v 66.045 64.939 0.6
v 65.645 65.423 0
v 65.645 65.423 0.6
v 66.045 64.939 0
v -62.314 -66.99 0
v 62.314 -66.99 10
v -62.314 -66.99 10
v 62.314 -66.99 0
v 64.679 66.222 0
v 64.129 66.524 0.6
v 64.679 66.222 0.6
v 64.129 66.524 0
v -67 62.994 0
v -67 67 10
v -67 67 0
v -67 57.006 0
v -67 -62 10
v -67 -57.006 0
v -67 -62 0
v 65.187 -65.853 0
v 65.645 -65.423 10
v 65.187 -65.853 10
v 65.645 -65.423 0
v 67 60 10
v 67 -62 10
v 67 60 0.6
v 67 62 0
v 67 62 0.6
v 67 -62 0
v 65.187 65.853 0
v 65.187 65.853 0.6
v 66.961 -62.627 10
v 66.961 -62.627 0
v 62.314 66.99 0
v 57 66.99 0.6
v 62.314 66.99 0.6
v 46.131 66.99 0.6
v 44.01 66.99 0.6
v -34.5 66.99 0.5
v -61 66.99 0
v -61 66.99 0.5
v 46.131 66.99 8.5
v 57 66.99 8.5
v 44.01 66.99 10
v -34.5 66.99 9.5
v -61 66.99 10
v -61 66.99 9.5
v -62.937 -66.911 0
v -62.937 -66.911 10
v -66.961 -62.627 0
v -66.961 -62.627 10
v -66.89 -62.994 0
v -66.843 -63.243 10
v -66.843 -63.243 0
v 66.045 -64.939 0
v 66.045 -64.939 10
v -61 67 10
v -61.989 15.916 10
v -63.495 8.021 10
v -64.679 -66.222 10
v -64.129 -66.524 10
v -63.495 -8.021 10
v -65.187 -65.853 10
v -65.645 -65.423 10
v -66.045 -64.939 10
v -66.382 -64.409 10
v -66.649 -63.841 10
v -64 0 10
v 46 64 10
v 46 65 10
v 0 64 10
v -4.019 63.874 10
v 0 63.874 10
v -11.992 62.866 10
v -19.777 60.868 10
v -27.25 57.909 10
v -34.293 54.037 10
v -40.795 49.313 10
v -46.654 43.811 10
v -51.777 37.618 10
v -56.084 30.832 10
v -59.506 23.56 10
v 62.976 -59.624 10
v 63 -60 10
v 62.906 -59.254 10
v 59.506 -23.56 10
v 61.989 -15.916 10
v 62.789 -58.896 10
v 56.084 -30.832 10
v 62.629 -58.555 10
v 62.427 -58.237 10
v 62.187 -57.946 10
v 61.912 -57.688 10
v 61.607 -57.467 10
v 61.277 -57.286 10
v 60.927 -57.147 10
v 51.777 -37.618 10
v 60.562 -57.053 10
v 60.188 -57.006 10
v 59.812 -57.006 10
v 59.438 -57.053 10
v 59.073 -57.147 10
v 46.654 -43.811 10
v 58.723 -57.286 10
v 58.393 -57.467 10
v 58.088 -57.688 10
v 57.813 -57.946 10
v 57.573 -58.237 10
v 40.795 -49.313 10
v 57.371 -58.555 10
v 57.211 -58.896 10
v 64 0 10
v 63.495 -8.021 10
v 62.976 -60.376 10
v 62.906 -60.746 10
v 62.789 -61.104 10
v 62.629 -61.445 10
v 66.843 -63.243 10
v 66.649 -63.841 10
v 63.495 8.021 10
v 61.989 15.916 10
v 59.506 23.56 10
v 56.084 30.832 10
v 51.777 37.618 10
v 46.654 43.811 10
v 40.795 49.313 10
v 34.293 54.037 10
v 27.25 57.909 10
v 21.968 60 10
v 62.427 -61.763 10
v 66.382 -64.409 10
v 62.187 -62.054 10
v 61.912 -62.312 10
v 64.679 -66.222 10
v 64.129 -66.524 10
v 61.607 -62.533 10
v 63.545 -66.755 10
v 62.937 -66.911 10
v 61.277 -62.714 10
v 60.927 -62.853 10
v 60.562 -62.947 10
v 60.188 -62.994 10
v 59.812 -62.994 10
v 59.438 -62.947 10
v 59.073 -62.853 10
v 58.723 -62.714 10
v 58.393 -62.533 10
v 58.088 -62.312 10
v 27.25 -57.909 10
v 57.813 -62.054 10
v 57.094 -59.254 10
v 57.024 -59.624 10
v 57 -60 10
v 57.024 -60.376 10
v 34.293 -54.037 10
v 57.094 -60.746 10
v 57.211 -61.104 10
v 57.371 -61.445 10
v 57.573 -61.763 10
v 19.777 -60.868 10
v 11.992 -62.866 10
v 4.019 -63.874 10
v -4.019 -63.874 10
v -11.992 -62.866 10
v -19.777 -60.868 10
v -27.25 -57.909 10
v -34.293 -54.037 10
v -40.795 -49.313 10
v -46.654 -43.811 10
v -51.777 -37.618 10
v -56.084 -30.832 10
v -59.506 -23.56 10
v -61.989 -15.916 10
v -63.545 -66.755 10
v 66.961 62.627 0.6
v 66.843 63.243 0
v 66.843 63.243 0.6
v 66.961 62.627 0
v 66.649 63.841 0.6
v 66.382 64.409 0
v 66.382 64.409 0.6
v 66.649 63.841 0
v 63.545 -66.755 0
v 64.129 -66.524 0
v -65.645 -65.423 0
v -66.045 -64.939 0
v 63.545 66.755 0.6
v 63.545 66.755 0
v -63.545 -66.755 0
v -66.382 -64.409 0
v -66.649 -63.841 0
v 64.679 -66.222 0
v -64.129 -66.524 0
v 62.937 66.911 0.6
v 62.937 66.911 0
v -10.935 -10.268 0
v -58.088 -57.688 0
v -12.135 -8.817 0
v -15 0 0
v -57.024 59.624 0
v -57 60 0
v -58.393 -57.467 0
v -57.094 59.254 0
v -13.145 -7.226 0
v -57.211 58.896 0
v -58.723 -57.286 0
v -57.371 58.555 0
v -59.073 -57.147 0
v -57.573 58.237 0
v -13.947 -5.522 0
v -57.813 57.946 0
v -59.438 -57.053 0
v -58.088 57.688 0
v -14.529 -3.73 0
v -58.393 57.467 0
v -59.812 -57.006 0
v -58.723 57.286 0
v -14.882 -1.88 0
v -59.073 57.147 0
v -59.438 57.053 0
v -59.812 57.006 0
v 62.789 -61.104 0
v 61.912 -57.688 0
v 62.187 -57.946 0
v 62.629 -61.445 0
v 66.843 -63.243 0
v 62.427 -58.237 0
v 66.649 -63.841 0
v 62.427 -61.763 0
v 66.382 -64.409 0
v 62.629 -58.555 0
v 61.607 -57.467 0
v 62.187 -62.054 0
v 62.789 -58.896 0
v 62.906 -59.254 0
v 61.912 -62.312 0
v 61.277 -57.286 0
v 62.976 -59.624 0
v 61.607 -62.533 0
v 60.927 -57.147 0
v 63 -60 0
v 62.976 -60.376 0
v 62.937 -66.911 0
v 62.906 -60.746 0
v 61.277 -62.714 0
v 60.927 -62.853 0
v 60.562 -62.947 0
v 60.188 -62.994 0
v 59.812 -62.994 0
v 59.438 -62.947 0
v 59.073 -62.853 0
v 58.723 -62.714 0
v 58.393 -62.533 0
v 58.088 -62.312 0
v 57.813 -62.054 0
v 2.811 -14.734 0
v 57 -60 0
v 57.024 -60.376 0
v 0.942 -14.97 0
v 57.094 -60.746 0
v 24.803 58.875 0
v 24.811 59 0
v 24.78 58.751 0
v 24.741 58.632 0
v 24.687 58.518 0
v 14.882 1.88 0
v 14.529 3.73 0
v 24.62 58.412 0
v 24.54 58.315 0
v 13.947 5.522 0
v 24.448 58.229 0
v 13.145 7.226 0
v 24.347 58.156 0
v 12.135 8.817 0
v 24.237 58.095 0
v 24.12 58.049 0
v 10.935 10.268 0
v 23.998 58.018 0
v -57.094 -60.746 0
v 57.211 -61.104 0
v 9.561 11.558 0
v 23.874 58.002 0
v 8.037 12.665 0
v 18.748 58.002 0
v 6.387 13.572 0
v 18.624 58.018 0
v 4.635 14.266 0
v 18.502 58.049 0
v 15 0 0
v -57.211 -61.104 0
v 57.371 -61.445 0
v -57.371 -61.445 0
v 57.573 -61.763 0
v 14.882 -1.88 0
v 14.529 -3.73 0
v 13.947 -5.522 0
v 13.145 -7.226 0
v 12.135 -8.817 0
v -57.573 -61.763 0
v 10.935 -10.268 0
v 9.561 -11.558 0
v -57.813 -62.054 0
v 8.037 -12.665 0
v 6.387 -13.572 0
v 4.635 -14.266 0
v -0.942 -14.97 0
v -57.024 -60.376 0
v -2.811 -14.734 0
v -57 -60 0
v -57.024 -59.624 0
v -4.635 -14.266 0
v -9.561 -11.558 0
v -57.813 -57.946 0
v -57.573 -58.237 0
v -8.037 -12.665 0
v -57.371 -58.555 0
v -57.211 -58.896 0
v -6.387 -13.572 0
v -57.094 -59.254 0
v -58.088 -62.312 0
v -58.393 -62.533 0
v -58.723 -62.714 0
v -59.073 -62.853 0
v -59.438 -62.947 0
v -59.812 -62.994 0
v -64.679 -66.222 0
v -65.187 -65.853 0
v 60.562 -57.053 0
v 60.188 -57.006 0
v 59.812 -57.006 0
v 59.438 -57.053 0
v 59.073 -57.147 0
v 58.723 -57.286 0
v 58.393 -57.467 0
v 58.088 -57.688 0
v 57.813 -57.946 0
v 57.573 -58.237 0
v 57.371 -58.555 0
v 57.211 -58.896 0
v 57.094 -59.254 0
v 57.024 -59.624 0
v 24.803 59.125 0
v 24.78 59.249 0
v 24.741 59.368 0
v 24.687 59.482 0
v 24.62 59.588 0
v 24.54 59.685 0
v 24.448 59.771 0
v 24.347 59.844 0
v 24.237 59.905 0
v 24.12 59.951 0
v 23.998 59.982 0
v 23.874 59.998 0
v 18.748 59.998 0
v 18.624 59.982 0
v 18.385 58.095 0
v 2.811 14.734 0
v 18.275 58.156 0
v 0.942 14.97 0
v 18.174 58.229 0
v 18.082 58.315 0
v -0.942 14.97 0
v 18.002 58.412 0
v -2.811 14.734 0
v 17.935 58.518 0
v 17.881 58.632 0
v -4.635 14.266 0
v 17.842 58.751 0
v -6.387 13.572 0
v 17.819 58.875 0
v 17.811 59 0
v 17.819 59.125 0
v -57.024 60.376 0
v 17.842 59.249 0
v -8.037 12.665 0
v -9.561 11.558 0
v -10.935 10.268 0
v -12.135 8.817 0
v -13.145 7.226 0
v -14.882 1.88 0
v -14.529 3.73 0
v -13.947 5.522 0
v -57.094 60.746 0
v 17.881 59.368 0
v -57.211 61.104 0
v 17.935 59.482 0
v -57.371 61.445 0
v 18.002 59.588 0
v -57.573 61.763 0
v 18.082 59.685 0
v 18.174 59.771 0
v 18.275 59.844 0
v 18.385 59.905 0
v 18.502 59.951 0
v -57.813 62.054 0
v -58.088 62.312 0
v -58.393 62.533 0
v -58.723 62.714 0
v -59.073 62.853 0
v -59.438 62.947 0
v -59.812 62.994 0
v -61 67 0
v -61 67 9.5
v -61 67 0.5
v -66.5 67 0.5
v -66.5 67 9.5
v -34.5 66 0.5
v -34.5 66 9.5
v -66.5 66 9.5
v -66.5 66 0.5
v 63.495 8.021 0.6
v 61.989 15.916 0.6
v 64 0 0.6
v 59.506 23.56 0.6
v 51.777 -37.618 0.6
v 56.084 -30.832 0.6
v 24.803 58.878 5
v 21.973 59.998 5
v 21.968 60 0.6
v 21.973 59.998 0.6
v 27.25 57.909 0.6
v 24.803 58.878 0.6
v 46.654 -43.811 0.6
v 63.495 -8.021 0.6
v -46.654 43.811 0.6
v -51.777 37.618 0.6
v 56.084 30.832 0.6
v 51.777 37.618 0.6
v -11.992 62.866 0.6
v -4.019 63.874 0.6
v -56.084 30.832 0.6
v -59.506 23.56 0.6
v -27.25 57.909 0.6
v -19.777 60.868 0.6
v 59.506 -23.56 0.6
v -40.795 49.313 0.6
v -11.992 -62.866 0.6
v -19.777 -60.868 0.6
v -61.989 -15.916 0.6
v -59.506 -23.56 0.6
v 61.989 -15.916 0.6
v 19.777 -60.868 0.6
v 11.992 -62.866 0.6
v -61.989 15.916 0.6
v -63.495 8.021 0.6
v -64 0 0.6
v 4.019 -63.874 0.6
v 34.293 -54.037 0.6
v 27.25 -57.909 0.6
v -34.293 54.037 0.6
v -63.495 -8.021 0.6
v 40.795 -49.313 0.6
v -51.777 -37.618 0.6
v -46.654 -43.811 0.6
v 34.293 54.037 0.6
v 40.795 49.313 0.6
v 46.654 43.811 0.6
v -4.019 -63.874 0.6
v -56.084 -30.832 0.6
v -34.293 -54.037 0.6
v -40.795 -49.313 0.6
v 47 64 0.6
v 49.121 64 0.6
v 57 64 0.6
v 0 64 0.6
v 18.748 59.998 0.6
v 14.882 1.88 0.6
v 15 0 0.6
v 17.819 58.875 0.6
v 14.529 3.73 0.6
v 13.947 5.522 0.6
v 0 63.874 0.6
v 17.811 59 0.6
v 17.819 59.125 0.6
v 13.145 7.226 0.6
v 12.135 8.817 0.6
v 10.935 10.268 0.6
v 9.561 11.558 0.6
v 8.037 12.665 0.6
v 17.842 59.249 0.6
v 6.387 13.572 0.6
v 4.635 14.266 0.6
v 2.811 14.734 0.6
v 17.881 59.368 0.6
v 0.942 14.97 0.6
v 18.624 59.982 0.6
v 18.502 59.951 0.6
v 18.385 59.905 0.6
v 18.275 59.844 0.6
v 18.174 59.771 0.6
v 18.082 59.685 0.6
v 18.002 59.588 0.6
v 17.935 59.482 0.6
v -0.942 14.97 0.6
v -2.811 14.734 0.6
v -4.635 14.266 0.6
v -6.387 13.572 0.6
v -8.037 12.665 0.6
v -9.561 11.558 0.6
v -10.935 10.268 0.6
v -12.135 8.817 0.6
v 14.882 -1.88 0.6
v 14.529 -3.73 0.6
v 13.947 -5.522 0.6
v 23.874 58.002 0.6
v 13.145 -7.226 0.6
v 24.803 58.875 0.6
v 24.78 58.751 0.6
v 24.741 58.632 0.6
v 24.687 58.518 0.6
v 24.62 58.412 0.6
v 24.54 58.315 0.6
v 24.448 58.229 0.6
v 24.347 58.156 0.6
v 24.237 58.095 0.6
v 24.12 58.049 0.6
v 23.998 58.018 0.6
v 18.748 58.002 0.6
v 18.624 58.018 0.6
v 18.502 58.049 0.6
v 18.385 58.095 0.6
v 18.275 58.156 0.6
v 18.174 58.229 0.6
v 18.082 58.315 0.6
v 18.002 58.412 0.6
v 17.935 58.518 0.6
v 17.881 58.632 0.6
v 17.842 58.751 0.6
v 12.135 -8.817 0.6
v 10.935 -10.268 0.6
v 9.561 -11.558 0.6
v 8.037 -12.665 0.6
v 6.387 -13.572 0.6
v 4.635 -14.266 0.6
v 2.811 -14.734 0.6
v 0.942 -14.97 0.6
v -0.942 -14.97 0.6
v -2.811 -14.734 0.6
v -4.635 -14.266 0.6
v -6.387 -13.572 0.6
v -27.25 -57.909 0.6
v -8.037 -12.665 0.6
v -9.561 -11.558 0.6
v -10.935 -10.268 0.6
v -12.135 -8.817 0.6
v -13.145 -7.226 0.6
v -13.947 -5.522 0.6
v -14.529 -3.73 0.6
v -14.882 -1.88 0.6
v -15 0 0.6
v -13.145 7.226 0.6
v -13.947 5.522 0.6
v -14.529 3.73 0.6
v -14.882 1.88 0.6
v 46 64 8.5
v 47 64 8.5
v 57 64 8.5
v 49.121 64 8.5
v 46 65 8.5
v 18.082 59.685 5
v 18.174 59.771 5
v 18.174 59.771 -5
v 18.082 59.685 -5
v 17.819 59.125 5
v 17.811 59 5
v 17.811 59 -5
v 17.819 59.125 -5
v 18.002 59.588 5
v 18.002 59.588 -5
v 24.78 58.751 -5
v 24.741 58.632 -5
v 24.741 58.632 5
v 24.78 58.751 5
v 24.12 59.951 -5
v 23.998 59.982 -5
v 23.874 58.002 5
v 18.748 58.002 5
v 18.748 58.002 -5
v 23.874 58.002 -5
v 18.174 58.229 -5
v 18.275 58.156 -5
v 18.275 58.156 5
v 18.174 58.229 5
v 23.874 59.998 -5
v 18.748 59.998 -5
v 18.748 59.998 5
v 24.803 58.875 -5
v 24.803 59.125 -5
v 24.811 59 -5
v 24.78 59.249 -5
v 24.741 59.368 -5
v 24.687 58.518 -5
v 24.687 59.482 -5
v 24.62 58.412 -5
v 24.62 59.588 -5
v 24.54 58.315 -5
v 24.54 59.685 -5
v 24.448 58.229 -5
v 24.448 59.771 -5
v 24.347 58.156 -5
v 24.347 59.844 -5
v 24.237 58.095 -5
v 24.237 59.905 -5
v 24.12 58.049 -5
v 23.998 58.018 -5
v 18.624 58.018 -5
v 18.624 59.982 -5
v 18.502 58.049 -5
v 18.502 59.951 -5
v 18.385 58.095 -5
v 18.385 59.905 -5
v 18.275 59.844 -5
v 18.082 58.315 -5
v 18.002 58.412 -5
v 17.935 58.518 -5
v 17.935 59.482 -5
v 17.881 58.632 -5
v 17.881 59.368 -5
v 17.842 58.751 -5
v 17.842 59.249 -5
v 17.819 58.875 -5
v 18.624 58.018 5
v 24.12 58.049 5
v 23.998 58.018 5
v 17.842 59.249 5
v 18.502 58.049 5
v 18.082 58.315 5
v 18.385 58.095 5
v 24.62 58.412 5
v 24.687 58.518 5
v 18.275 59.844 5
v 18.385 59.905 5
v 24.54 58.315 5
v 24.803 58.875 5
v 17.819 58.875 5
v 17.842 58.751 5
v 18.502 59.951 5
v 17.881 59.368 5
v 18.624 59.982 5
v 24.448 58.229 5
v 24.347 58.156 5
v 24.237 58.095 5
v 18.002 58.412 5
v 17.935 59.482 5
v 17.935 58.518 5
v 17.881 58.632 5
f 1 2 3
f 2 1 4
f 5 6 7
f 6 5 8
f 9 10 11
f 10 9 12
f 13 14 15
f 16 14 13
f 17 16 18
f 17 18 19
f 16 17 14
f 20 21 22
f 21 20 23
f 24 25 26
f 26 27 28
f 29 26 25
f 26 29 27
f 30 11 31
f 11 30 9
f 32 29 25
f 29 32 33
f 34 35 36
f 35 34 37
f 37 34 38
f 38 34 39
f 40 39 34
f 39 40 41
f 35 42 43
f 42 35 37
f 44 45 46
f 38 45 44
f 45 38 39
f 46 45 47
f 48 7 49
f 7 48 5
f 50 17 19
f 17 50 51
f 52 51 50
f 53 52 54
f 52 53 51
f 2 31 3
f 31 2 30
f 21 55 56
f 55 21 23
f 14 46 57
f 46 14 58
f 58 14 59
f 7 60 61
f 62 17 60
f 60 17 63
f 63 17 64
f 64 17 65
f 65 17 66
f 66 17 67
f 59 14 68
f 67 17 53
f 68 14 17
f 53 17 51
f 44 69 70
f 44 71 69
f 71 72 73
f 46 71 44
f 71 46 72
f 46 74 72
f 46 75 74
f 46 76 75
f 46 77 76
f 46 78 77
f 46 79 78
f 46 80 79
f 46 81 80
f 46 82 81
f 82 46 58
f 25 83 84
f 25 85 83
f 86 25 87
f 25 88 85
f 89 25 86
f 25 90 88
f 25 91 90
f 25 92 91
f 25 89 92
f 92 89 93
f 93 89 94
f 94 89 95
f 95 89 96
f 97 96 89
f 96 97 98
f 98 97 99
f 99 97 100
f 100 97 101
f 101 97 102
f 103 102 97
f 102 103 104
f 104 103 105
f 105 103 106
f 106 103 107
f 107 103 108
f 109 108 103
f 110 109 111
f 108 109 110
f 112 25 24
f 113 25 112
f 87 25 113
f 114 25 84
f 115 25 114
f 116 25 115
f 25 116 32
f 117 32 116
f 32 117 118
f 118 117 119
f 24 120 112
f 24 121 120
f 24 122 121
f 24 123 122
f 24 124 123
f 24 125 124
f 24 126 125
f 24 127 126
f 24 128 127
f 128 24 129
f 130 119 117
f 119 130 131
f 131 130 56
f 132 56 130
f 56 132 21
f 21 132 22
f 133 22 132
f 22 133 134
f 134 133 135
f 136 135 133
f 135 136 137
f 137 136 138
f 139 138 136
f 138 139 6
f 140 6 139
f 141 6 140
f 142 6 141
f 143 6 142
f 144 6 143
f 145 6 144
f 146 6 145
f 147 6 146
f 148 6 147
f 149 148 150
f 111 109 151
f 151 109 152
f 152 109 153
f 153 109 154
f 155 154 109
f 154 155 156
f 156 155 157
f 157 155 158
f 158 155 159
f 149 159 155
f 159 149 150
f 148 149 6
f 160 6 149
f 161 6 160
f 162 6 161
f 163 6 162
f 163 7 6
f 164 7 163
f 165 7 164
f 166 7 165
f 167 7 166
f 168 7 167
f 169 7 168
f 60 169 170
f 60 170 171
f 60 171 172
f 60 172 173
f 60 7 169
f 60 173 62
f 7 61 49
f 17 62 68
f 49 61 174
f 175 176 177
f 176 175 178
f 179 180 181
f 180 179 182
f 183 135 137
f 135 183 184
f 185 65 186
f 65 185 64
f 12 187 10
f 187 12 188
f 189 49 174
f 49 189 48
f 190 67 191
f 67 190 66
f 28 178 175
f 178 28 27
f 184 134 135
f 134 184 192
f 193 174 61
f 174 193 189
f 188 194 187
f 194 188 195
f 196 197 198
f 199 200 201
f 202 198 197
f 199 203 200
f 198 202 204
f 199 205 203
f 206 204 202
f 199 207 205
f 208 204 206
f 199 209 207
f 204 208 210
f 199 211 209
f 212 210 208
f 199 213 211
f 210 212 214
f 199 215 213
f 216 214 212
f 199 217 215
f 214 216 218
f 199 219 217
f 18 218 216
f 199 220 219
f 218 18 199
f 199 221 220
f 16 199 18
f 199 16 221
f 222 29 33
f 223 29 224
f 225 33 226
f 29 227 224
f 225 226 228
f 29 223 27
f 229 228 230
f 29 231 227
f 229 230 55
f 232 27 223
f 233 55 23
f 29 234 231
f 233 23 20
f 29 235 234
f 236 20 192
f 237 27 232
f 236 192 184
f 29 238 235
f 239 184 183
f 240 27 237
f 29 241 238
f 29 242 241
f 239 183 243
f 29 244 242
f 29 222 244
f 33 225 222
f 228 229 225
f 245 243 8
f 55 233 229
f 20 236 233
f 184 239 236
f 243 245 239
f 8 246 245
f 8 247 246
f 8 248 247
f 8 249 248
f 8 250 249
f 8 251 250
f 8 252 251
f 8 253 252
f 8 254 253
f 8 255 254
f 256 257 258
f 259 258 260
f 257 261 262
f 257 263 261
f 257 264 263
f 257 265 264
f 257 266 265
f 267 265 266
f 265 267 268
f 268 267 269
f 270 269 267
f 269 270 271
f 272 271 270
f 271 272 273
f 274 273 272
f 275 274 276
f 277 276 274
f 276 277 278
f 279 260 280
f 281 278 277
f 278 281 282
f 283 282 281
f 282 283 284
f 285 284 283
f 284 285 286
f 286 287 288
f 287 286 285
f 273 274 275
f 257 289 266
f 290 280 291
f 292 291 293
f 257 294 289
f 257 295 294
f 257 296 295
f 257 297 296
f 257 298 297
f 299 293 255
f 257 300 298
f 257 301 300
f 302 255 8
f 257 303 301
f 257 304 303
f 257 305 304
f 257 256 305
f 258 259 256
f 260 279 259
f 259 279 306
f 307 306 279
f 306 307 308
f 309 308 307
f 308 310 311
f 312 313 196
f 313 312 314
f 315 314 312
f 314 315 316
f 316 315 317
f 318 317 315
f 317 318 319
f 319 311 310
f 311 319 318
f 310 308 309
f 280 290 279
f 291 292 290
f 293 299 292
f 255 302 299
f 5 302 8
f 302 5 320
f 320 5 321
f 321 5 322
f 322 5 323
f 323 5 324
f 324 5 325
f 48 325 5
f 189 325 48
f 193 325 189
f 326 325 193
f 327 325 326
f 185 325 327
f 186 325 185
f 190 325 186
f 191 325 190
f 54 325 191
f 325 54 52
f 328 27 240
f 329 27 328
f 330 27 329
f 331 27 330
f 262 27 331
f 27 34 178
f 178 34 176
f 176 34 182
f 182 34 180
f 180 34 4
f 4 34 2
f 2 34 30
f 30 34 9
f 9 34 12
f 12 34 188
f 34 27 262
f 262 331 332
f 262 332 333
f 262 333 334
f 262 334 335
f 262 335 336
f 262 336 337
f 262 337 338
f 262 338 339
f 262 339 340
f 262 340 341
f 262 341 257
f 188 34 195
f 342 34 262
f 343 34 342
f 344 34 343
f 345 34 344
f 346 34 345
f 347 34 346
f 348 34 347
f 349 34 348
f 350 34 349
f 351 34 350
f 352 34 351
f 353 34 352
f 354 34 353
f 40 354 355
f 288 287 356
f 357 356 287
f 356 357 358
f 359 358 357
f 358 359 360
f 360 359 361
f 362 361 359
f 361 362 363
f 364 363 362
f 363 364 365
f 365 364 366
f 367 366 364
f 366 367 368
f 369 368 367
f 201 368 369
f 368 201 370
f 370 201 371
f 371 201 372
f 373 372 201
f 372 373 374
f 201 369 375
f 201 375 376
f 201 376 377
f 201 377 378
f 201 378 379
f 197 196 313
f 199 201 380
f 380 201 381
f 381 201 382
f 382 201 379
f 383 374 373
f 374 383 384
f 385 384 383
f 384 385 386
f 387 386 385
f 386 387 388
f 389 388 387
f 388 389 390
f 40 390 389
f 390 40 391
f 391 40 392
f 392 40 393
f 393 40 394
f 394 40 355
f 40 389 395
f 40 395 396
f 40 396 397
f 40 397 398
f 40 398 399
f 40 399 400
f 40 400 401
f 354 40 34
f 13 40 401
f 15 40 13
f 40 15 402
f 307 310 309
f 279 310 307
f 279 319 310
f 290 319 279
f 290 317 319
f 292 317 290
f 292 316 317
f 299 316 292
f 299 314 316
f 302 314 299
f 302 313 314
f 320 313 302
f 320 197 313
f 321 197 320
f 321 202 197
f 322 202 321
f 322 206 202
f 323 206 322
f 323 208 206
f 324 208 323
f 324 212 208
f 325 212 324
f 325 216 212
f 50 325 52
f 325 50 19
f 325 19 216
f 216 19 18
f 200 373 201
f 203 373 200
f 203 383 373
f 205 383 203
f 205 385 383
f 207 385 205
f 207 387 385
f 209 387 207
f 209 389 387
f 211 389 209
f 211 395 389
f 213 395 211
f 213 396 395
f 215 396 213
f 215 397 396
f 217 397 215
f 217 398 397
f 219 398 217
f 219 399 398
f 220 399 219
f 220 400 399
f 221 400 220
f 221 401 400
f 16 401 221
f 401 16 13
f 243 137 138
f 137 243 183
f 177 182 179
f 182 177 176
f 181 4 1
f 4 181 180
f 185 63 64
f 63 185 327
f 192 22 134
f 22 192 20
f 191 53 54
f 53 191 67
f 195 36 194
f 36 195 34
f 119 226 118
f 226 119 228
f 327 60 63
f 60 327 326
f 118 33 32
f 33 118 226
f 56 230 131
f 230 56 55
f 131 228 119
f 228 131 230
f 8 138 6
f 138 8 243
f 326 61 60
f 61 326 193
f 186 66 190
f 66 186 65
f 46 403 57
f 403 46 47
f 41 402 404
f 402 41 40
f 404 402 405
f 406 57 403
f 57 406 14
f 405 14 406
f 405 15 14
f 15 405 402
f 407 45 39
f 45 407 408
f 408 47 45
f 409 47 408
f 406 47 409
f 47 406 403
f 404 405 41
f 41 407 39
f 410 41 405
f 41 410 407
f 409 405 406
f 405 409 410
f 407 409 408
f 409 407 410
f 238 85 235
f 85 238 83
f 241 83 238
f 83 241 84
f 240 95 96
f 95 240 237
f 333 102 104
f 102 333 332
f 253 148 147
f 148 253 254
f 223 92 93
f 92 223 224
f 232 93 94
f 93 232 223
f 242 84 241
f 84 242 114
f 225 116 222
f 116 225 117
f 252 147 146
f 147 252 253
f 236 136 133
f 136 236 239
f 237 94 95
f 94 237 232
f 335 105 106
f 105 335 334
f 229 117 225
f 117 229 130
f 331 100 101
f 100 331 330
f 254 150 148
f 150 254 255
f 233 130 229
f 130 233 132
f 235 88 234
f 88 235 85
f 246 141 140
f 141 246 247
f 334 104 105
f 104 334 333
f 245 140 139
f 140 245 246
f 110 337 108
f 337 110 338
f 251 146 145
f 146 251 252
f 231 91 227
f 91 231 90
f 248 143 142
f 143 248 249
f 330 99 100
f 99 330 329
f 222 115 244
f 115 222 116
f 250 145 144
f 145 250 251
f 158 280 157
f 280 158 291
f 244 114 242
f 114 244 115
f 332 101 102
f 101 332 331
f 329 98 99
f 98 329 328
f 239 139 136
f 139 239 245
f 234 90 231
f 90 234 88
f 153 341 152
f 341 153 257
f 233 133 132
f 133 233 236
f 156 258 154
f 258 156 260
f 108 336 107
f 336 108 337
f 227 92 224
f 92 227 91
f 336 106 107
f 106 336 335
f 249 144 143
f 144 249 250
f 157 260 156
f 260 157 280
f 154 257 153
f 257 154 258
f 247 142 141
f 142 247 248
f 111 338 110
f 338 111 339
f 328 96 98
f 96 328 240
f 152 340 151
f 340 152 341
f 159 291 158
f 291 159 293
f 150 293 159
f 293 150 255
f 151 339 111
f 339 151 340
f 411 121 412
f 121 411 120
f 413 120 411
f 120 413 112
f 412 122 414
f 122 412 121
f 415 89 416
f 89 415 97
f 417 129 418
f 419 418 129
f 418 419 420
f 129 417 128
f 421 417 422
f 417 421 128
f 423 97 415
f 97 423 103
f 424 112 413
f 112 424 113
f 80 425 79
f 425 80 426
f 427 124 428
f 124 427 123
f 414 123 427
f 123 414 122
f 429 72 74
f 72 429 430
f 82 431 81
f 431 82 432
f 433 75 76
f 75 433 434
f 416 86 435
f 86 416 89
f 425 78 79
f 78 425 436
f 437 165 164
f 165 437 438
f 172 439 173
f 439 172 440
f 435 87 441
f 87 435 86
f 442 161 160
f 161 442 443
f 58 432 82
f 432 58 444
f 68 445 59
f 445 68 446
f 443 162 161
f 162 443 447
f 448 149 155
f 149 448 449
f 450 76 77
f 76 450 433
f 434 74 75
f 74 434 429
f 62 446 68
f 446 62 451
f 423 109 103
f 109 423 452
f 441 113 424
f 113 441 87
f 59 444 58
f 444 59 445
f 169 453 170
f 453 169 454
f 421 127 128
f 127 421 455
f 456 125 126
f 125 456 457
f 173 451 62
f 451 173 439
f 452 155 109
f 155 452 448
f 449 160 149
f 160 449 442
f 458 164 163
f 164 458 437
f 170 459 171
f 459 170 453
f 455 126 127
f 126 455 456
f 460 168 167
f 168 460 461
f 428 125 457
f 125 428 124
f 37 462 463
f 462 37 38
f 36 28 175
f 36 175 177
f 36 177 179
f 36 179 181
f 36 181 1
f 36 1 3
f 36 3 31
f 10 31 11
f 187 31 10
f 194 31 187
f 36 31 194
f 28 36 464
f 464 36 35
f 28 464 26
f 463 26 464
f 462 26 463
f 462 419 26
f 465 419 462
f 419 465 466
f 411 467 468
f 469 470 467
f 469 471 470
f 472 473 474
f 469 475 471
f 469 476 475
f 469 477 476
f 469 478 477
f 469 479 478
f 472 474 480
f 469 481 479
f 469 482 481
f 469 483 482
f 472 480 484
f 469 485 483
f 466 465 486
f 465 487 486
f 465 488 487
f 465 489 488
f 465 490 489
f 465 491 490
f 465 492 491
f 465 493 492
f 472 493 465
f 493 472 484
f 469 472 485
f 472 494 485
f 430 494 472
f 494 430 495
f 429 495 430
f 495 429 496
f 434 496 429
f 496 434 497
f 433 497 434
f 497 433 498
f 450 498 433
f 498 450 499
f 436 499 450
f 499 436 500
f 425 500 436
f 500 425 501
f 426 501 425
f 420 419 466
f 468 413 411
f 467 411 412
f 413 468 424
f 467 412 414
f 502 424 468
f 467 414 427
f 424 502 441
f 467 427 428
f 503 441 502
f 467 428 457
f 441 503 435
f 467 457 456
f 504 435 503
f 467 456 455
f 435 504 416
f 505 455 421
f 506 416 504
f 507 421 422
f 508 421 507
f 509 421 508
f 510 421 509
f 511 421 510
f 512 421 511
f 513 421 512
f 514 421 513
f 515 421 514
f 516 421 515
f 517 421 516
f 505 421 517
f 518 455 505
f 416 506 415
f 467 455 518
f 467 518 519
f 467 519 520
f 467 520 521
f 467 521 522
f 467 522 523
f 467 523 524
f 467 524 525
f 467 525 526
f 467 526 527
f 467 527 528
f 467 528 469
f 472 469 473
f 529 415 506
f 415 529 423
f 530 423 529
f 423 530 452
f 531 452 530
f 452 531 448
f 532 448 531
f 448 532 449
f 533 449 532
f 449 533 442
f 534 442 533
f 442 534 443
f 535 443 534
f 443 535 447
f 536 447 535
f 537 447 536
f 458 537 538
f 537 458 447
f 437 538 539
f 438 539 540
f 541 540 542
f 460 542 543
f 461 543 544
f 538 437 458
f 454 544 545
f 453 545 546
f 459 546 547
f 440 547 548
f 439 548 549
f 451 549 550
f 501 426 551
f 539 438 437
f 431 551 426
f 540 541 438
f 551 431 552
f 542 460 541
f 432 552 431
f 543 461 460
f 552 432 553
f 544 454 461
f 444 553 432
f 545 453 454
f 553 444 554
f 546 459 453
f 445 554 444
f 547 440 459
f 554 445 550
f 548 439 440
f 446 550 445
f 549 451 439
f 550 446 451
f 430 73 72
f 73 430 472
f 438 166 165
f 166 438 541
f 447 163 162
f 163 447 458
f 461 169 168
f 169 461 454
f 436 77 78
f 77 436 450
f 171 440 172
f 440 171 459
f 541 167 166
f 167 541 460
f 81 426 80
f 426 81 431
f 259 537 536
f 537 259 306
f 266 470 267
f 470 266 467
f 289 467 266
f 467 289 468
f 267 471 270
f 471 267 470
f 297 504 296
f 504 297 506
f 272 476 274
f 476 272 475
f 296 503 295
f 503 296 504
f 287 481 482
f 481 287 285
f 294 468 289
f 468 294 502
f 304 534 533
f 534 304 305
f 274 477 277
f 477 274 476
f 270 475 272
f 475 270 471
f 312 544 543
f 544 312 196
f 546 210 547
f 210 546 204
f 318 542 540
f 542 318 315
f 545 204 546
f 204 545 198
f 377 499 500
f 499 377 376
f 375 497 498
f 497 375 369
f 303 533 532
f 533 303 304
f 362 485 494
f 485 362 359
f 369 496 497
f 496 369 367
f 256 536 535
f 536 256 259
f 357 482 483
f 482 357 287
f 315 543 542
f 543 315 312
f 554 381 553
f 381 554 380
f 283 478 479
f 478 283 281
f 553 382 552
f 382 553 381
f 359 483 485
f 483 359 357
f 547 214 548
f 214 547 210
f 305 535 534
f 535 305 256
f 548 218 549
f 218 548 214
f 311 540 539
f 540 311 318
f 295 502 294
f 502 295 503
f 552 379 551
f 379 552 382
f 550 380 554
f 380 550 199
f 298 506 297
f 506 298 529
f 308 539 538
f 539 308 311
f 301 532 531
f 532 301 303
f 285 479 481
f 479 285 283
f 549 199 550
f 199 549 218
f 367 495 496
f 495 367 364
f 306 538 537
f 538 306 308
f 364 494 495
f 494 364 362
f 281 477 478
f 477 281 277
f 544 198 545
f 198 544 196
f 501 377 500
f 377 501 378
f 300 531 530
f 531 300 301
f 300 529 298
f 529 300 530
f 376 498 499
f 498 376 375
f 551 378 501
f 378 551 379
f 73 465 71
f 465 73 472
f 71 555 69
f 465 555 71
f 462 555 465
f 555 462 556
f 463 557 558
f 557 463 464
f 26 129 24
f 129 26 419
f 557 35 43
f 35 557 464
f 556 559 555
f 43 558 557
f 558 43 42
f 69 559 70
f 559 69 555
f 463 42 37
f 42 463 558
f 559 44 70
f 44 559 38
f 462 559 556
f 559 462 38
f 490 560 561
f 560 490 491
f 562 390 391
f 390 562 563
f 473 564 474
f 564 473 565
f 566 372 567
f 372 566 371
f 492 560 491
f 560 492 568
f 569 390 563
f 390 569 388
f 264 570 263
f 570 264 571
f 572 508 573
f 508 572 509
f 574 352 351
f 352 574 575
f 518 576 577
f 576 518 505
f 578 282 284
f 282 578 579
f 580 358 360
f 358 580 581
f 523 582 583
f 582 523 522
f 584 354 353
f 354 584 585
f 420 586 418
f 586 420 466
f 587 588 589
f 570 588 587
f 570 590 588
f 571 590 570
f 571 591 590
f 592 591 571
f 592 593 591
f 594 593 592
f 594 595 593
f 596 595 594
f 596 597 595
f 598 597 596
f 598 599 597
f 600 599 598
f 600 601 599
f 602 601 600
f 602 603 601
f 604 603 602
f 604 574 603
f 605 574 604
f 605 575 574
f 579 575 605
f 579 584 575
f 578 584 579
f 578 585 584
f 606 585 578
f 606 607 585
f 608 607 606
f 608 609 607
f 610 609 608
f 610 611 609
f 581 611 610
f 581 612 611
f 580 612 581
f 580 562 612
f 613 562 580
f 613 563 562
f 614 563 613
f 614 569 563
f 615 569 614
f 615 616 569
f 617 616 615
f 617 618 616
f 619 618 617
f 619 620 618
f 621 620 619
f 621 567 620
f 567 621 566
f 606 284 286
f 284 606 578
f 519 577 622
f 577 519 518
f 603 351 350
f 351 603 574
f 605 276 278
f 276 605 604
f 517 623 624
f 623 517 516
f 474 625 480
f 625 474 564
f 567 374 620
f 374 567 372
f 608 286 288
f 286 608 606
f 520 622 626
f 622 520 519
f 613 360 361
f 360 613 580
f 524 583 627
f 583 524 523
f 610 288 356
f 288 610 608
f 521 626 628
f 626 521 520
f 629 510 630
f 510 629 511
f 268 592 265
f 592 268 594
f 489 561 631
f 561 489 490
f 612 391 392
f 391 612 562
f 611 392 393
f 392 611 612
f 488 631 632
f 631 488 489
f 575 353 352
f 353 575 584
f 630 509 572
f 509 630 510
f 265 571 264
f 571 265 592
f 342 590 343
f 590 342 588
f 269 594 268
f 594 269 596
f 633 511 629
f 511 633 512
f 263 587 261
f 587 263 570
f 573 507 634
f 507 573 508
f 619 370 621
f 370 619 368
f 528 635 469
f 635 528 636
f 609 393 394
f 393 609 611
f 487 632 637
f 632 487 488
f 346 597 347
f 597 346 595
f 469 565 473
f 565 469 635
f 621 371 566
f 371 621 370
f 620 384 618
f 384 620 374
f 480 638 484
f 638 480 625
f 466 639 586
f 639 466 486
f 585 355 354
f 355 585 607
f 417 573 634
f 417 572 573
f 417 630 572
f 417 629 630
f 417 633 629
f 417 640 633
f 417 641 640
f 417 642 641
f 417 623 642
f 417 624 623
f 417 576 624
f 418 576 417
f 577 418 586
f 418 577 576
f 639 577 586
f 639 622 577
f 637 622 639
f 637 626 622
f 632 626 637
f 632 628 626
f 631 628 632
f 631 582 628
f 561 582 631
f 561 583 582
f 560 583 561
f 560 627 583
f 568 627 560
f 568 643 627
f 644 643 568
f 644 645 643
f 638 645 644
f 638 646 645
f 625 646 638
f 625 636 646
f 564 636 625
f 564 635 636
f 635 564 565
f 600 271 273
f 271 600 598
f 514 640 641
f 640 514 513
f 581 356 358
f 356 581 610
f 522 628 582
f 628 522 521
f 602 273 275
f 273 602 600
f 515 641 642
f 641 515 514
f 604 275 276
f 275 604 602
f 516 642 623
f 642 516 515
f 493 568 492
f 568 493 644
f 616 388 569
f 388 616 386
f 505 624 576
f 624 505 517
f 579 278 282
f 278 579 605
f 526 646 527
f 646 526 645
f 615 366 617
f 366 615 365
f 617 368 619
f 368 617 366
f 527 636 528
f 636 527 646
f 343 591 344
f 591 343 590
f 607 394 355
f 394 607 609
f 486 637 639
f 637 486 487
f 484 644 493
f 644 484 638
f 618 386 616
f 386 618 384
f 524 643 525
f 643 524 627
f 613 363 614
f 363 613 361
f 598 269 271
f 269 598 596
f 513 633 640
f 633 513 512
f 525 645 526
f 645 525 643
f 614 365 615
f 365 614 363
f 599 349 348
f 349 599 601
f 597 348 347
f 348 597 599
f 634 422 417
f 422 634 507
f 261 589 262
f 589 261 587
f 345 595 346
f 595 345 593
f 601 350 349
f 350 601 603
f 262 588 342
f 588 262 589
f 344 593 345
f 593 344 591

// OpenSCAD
$fn = 50;


union() {
	difference() {
		union() {
			hull() {
				translate(v = [-62.0000000000, 62.0000000000, 0]) {
					cylinder(h = 10, r = 5);
				}
				translate(v = [62.0000000000, 62.0000000000, 0]) {
					cylinder(h = 10, r = 5);
				}
				translate(v = [-62.0000000000, -62.0000000000, 0]) {
					cylinder(h = 10, r = 5);
				}
				translate(v = [62.0000000000, -62.0000000000, 0]) {
					cylinder(h = 10, r = 5);
				}
			}
			translate(v = [-67.0000000000, 61.0000000000, 0]) {
				cube(size = [6, 6, 10]);
			}
		}
		union() {
			translate(v = [-67.5000000000, -60.0000000000, -250.0000000000]) {
				rotate(a = [0, 0, 0]) {
					difference() {
						union() {
							hull() {
								translate(v = [7.5000000000, 0, 0]) {
									cylinder(h = 250, r = 3.0000000000, r1 = 3.0000000000, r2 = 3.0000000000);
								}
								translate(v = [-7.5000000000, 0, 0]) {
									cylinder(h = 250, r = 3.0000000000, r1 = 3.0000000000, r2 = 3.0000000000);
								}
							}
						}
						union();
					}
				}
			}
			translate(v = [-67.5000000000, 60.0000000000, -250.0000000000]) {
				rotate(a = [0, 0, 0]) {
					difference() {
						union() {
							hull() {
								translate(v = [7.5000000000, 0, 0]) {
									cylinder(h = 250, r = 3.0000000000, r1 = 3.0000000000, r2 = 3.0000000000);
								}
								translate(v = [-7.5000000000, 0, 0]) {
									cylinder(h = 250, r = 3.0000000000, r1 = 3.0000000000, r2 = 3.0000000000);
								}
							}
						}
						union();
					}
				}
			}
			translate(v = [-66.5000000000, 66.0000000000, 0.5000000000]) {
				cube(size = [32, 1, 9.0000000000]);
			}
			translate(v = [60.0000000000, -60.0000000000, 0]) {
				cylinder(h = 100, r = 3.0000000000);
			}
			translate(v = [0, 0, 0.6000000000]) {
				cylinder(h = 12.4000000000, r = 64.0000000000);
			}
			translate(v = [0, 0, -5.0000000000]) {
				cylinder(h = 10, r = 15.0000000000);
			}
			translate(v = [0.0000000000, 60.0000000000, 0.6000000000]) {
				cube(size = [67.0000000000, 4, 12.4000000000]);
			}
			translate(v = [57.0000000000, 60.0000000000, 0.6000000000]) {
				cube(size = [10, 7, 12.4000000000]);
			}
			translate(v = [46.0000000000, 60.0000000000, 8.5000000000]) {
				cube(size = [21, 7, 1.5000000000]);
			}
			translate(v = [43.2500000000, 67.7500000000, 0.6000000000]) {
				rotate(a = [0, 0, -45]) {
					cube(size = [7.5000000000, 1.5000000000, 12.4000000000]);
				}
			}
			translate(v = [12.0610000000, 58.0000000000, 0.6000000000]) {
				cube(size = [7.5000000000, 2, 9.4000000000]);
			}
		}
	}
	union() {
		translate(v = [21.3110000000, 59.0000000000, -5.0000000000]) {
			rotate(a = [0, 0, 0]) {
				difference() {
					union() {
						#hull() {
							#translate(v = [2.5000000000, 0, 0]) {
								cylinder(h = 10, r = 1.0000000000, r1 = 1.0000000000, r2 = 1.0000000000);
							}
							#translate(v = [-2.5000000000, 0, 0]) {
								cylinder(h = 10, r = 1.0000000000, r1 = 1.0000000000, r2 = 1.0000000000);
							}
						}
					}
					union();
				}
			}
		}
	}
}
